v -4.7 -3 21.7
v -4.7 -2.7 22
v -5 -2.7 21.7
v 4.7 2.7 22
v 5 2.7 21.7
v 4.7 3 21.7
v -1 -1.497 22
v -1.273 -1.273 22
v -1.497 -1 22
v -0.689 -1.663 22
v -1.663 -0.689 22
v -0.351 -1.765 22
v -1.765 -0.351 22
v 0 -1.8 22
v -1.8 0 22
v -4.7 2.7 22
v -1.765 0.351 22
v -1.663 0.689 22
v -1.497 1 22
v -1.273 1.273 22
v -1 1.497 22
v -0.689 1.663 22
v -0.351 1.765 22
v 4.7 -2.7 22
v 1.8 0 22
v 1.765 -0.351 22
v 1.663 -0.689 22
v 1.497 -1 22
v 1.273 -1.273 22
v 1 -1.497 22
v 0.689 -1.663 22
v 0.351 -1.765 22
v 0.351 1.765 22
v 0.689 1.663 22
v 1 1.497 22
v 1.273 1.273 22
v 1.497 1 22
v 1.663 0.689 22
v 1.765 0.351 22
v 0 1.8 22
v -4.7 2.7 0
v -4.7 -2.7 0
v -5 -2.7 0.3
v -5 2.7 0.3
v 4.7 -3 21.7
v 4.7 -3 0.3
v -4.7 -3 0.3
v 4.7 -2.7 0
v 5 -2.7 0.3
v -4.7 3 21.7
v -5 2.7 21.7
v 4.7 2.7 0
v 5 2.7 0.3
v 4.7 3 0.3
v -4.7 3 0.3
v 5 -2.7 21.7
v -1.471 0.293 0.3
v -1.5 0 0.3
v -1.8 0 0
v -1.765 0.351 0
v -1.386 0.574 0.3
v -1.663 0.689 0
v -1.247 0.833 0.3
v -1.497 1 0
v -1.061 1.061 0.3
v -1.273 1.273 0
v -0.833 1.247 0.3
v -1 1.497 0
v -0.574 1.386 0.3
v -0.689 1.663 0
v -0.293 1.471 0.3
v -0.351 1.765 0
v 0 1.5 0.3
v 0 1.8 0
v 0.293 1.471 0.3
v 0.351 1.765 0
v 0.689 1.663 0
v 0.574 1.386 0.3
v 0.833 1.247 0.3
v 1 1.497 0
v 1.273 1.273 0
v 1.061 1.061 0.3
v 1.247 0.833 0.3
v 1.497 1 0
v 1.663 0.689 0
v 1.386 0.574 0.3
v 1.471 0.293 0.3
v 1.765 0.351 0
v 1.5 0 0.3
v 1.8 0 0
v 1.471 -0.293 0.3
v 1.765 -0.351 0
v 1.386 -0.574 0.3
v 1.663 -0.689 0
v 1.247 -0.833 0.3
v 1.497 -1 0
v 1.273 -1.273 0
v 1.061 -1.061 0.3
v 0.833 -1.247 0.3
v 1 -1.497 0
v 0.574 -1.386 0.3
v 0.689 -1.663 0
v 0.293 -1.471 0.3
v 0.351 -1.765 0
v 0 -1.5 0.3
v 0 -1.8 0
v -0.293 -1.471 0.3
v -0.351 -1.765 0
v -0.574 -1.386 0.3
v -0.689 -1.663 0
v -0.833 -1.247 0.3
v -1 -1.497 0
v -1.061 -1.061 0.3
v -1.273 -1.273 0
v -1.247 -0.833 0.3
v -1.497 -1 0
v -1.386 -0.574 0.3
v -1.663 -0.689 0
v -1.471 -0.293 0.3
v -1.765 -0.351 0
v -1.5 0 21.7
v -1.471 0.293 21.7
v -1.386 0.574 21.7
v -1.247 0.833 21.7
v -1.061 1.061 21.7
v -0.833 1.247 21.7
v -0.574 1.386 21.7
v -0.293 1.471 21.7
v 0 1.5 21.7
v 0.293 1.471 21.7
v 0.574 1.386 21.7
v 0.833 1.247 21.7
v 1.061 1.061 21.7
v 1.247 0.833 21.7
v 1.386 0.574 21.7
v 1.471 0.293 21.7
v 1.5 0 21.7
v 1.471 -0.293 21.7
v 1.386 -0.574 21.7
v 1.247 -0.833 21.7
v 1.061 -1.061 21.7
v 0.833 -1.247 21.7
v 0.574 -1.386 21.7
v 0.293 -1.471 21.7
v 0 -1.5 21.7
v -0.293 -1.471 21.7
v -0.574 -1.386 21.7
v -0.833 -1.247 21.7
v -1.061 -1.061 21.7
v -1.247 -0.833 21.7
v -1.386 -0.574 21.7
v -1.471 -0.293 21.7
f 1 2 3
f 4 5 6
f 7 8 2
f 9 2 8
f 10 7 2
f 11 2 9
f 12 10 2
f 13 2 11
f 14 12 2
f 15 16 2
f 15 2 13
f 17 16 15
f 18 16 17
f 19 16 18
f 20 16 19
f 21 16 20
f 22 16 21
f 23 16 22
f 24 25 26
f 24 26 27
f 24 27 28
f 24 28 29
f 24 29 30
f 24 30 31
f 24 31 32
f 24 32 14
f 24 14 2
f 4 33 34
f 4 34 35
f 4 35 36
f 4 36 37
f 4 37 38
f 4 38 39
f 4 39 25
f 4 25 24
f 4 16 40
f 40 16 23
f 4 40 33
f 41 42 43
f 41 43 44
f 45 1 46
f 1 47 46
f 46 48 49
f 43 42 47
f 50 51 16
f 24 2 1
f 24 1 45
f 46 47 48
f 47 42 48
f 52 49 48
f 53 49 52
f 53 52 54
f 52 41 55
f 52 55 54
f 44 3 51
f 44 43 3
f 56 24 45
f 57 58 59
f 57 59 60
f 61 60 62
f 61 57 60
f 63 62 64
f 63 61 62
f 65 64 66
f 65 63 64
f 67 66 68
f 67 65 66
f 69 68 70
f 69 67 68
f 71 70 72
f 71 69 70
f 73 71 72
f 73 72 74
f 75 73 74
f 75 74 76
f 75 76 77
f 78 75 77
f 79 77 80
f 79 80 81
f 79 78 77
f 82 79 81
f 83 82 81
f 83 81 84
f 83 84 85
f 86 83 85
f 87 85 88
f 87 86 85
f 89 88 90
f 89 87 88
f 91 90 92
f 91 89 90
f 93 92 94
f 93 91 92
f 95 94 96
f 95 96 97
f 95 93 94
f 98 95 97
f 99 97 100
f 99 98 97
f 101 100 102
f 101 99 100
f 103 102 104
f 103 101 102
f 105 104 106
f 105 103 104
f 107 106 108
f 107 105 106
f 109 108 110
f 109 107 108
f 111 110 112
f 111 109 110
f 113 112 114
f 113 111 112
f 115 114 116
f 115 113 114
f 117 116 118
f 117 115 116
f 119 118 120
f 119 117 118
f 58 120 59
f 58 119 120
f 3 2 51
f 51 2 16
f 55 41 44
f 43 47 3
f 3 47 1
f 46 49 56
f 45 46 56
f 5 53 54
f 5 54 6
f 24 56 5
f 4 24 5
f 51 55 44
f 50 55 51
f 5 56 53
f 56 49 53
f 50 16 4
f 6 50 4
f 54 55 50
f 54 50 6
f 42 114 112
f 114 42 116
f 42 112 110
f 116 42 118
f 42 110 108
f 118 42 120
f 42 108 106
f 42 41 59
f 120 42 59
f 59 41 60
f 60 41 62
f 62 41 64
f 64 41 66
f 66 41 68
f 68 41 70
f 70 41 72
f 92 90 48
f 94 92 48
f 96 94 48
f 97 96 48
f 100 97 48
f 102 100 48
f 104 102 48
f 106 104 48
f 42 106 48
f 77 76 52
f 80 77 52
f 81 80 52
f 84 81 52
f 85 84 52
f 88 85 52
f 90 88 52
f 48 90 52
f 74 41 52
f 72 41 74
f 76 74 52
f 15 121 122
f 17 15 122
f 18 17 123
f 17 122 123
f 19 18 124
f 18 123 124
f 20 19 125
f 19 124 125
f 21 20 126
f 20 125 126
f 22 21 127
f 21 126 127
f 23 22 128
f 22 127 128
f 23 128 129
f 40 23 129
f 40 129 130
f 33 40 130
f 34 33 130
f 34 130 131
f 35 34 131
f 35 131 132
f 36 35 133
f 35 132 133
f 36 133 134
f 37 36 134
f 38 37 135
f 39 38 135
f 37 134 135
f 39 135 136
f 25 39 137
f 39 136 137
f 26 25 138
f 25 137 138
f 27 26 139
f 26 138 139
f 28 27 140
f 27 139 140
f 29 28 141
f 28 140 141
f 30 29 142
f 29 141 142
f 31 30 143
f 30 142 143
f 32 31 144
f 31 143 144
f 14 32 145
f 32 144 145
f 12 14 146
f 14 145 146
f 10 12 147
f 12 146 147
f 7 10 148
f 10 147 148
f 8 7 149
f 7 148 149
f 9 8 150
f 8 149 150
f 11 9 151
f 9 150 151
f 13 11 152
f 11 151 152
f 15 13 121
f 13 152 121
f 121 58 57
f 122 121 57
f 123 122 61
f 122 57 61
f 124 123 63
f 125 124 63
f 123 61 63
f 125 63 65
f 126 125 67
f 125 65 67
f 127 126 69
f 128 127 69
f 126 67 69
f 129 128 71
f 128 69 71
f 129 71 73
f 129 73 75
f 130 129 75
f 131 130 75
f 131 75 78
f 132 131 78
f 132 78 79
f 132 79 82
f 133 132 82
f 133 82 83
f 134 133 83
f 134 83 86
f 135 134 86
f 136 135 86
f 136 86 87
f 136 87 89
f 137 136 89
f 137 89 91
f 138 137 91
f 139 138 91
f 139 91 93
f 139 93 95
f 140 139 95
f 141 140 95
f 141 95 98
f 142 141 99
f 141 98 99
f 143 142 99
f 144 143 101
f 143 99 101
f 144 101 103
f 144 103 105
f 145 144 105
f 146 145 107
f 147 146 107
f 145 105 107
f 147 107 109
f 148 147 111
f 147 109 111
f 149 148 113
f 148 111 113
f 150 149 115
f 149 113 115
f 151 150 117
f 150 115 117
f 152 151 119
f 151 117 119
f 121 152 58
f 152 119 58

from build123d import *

# Parameters (mm, degrees)
SKETCH_1_W          = 10
SKETCH_1_H          = 6
EXTRUDE_1_DEPTH     = 22
SKETCH_3_R          = 1.5
CUT_EXTRUDE_1_DEPTH = 23.759613353
CHAMFER_1_SIZE      = 0.3


with BuildPart() as part:
    # 草图1 → 凸台-拉伸1 (new body)
    with BuildSketch(Plane.XY):
        Rectangle(SKETCH_1_W, SKETCH_1_H)
    extrude(amount=EXTRUDE_1_DEPTH)

    # 草图3 → 切除-拉伸1 (cut, through all)
    with BuildSketch(Plane(origin=(0, 0, 0), x_dir=(-1, 0, 0), z_dir=(0, 0, -1))):
        Circle(SKETCH_3_R)
    extrude(amount=-CUT_EXTRUDE_1_DEPTH, mode=Mode.SUBTRACT)

    # 倒角1
    chamfer_1_edges = [part.edges().sort_by_distance(p)[0] for p in [
        (-5, 0, 22),
        (1.5, 0, 22),
        (1.5, 0, 0),
        (0, -3, 22),
        (5, 0, 22),
        (0, -3, 0),
        (-5, 0, 0),
        (0, 3, 0),
        (5, 0, 0),
        (5, -3, 11),
        (-5, -3, 11),
        (-5, 3, 11),
        (5, 3, 11),
        (0, 3, 22),
    ]]
    chamfer(chamfer_1_edges, length=CHAMFER_1_SIZE)


solid = part.part
